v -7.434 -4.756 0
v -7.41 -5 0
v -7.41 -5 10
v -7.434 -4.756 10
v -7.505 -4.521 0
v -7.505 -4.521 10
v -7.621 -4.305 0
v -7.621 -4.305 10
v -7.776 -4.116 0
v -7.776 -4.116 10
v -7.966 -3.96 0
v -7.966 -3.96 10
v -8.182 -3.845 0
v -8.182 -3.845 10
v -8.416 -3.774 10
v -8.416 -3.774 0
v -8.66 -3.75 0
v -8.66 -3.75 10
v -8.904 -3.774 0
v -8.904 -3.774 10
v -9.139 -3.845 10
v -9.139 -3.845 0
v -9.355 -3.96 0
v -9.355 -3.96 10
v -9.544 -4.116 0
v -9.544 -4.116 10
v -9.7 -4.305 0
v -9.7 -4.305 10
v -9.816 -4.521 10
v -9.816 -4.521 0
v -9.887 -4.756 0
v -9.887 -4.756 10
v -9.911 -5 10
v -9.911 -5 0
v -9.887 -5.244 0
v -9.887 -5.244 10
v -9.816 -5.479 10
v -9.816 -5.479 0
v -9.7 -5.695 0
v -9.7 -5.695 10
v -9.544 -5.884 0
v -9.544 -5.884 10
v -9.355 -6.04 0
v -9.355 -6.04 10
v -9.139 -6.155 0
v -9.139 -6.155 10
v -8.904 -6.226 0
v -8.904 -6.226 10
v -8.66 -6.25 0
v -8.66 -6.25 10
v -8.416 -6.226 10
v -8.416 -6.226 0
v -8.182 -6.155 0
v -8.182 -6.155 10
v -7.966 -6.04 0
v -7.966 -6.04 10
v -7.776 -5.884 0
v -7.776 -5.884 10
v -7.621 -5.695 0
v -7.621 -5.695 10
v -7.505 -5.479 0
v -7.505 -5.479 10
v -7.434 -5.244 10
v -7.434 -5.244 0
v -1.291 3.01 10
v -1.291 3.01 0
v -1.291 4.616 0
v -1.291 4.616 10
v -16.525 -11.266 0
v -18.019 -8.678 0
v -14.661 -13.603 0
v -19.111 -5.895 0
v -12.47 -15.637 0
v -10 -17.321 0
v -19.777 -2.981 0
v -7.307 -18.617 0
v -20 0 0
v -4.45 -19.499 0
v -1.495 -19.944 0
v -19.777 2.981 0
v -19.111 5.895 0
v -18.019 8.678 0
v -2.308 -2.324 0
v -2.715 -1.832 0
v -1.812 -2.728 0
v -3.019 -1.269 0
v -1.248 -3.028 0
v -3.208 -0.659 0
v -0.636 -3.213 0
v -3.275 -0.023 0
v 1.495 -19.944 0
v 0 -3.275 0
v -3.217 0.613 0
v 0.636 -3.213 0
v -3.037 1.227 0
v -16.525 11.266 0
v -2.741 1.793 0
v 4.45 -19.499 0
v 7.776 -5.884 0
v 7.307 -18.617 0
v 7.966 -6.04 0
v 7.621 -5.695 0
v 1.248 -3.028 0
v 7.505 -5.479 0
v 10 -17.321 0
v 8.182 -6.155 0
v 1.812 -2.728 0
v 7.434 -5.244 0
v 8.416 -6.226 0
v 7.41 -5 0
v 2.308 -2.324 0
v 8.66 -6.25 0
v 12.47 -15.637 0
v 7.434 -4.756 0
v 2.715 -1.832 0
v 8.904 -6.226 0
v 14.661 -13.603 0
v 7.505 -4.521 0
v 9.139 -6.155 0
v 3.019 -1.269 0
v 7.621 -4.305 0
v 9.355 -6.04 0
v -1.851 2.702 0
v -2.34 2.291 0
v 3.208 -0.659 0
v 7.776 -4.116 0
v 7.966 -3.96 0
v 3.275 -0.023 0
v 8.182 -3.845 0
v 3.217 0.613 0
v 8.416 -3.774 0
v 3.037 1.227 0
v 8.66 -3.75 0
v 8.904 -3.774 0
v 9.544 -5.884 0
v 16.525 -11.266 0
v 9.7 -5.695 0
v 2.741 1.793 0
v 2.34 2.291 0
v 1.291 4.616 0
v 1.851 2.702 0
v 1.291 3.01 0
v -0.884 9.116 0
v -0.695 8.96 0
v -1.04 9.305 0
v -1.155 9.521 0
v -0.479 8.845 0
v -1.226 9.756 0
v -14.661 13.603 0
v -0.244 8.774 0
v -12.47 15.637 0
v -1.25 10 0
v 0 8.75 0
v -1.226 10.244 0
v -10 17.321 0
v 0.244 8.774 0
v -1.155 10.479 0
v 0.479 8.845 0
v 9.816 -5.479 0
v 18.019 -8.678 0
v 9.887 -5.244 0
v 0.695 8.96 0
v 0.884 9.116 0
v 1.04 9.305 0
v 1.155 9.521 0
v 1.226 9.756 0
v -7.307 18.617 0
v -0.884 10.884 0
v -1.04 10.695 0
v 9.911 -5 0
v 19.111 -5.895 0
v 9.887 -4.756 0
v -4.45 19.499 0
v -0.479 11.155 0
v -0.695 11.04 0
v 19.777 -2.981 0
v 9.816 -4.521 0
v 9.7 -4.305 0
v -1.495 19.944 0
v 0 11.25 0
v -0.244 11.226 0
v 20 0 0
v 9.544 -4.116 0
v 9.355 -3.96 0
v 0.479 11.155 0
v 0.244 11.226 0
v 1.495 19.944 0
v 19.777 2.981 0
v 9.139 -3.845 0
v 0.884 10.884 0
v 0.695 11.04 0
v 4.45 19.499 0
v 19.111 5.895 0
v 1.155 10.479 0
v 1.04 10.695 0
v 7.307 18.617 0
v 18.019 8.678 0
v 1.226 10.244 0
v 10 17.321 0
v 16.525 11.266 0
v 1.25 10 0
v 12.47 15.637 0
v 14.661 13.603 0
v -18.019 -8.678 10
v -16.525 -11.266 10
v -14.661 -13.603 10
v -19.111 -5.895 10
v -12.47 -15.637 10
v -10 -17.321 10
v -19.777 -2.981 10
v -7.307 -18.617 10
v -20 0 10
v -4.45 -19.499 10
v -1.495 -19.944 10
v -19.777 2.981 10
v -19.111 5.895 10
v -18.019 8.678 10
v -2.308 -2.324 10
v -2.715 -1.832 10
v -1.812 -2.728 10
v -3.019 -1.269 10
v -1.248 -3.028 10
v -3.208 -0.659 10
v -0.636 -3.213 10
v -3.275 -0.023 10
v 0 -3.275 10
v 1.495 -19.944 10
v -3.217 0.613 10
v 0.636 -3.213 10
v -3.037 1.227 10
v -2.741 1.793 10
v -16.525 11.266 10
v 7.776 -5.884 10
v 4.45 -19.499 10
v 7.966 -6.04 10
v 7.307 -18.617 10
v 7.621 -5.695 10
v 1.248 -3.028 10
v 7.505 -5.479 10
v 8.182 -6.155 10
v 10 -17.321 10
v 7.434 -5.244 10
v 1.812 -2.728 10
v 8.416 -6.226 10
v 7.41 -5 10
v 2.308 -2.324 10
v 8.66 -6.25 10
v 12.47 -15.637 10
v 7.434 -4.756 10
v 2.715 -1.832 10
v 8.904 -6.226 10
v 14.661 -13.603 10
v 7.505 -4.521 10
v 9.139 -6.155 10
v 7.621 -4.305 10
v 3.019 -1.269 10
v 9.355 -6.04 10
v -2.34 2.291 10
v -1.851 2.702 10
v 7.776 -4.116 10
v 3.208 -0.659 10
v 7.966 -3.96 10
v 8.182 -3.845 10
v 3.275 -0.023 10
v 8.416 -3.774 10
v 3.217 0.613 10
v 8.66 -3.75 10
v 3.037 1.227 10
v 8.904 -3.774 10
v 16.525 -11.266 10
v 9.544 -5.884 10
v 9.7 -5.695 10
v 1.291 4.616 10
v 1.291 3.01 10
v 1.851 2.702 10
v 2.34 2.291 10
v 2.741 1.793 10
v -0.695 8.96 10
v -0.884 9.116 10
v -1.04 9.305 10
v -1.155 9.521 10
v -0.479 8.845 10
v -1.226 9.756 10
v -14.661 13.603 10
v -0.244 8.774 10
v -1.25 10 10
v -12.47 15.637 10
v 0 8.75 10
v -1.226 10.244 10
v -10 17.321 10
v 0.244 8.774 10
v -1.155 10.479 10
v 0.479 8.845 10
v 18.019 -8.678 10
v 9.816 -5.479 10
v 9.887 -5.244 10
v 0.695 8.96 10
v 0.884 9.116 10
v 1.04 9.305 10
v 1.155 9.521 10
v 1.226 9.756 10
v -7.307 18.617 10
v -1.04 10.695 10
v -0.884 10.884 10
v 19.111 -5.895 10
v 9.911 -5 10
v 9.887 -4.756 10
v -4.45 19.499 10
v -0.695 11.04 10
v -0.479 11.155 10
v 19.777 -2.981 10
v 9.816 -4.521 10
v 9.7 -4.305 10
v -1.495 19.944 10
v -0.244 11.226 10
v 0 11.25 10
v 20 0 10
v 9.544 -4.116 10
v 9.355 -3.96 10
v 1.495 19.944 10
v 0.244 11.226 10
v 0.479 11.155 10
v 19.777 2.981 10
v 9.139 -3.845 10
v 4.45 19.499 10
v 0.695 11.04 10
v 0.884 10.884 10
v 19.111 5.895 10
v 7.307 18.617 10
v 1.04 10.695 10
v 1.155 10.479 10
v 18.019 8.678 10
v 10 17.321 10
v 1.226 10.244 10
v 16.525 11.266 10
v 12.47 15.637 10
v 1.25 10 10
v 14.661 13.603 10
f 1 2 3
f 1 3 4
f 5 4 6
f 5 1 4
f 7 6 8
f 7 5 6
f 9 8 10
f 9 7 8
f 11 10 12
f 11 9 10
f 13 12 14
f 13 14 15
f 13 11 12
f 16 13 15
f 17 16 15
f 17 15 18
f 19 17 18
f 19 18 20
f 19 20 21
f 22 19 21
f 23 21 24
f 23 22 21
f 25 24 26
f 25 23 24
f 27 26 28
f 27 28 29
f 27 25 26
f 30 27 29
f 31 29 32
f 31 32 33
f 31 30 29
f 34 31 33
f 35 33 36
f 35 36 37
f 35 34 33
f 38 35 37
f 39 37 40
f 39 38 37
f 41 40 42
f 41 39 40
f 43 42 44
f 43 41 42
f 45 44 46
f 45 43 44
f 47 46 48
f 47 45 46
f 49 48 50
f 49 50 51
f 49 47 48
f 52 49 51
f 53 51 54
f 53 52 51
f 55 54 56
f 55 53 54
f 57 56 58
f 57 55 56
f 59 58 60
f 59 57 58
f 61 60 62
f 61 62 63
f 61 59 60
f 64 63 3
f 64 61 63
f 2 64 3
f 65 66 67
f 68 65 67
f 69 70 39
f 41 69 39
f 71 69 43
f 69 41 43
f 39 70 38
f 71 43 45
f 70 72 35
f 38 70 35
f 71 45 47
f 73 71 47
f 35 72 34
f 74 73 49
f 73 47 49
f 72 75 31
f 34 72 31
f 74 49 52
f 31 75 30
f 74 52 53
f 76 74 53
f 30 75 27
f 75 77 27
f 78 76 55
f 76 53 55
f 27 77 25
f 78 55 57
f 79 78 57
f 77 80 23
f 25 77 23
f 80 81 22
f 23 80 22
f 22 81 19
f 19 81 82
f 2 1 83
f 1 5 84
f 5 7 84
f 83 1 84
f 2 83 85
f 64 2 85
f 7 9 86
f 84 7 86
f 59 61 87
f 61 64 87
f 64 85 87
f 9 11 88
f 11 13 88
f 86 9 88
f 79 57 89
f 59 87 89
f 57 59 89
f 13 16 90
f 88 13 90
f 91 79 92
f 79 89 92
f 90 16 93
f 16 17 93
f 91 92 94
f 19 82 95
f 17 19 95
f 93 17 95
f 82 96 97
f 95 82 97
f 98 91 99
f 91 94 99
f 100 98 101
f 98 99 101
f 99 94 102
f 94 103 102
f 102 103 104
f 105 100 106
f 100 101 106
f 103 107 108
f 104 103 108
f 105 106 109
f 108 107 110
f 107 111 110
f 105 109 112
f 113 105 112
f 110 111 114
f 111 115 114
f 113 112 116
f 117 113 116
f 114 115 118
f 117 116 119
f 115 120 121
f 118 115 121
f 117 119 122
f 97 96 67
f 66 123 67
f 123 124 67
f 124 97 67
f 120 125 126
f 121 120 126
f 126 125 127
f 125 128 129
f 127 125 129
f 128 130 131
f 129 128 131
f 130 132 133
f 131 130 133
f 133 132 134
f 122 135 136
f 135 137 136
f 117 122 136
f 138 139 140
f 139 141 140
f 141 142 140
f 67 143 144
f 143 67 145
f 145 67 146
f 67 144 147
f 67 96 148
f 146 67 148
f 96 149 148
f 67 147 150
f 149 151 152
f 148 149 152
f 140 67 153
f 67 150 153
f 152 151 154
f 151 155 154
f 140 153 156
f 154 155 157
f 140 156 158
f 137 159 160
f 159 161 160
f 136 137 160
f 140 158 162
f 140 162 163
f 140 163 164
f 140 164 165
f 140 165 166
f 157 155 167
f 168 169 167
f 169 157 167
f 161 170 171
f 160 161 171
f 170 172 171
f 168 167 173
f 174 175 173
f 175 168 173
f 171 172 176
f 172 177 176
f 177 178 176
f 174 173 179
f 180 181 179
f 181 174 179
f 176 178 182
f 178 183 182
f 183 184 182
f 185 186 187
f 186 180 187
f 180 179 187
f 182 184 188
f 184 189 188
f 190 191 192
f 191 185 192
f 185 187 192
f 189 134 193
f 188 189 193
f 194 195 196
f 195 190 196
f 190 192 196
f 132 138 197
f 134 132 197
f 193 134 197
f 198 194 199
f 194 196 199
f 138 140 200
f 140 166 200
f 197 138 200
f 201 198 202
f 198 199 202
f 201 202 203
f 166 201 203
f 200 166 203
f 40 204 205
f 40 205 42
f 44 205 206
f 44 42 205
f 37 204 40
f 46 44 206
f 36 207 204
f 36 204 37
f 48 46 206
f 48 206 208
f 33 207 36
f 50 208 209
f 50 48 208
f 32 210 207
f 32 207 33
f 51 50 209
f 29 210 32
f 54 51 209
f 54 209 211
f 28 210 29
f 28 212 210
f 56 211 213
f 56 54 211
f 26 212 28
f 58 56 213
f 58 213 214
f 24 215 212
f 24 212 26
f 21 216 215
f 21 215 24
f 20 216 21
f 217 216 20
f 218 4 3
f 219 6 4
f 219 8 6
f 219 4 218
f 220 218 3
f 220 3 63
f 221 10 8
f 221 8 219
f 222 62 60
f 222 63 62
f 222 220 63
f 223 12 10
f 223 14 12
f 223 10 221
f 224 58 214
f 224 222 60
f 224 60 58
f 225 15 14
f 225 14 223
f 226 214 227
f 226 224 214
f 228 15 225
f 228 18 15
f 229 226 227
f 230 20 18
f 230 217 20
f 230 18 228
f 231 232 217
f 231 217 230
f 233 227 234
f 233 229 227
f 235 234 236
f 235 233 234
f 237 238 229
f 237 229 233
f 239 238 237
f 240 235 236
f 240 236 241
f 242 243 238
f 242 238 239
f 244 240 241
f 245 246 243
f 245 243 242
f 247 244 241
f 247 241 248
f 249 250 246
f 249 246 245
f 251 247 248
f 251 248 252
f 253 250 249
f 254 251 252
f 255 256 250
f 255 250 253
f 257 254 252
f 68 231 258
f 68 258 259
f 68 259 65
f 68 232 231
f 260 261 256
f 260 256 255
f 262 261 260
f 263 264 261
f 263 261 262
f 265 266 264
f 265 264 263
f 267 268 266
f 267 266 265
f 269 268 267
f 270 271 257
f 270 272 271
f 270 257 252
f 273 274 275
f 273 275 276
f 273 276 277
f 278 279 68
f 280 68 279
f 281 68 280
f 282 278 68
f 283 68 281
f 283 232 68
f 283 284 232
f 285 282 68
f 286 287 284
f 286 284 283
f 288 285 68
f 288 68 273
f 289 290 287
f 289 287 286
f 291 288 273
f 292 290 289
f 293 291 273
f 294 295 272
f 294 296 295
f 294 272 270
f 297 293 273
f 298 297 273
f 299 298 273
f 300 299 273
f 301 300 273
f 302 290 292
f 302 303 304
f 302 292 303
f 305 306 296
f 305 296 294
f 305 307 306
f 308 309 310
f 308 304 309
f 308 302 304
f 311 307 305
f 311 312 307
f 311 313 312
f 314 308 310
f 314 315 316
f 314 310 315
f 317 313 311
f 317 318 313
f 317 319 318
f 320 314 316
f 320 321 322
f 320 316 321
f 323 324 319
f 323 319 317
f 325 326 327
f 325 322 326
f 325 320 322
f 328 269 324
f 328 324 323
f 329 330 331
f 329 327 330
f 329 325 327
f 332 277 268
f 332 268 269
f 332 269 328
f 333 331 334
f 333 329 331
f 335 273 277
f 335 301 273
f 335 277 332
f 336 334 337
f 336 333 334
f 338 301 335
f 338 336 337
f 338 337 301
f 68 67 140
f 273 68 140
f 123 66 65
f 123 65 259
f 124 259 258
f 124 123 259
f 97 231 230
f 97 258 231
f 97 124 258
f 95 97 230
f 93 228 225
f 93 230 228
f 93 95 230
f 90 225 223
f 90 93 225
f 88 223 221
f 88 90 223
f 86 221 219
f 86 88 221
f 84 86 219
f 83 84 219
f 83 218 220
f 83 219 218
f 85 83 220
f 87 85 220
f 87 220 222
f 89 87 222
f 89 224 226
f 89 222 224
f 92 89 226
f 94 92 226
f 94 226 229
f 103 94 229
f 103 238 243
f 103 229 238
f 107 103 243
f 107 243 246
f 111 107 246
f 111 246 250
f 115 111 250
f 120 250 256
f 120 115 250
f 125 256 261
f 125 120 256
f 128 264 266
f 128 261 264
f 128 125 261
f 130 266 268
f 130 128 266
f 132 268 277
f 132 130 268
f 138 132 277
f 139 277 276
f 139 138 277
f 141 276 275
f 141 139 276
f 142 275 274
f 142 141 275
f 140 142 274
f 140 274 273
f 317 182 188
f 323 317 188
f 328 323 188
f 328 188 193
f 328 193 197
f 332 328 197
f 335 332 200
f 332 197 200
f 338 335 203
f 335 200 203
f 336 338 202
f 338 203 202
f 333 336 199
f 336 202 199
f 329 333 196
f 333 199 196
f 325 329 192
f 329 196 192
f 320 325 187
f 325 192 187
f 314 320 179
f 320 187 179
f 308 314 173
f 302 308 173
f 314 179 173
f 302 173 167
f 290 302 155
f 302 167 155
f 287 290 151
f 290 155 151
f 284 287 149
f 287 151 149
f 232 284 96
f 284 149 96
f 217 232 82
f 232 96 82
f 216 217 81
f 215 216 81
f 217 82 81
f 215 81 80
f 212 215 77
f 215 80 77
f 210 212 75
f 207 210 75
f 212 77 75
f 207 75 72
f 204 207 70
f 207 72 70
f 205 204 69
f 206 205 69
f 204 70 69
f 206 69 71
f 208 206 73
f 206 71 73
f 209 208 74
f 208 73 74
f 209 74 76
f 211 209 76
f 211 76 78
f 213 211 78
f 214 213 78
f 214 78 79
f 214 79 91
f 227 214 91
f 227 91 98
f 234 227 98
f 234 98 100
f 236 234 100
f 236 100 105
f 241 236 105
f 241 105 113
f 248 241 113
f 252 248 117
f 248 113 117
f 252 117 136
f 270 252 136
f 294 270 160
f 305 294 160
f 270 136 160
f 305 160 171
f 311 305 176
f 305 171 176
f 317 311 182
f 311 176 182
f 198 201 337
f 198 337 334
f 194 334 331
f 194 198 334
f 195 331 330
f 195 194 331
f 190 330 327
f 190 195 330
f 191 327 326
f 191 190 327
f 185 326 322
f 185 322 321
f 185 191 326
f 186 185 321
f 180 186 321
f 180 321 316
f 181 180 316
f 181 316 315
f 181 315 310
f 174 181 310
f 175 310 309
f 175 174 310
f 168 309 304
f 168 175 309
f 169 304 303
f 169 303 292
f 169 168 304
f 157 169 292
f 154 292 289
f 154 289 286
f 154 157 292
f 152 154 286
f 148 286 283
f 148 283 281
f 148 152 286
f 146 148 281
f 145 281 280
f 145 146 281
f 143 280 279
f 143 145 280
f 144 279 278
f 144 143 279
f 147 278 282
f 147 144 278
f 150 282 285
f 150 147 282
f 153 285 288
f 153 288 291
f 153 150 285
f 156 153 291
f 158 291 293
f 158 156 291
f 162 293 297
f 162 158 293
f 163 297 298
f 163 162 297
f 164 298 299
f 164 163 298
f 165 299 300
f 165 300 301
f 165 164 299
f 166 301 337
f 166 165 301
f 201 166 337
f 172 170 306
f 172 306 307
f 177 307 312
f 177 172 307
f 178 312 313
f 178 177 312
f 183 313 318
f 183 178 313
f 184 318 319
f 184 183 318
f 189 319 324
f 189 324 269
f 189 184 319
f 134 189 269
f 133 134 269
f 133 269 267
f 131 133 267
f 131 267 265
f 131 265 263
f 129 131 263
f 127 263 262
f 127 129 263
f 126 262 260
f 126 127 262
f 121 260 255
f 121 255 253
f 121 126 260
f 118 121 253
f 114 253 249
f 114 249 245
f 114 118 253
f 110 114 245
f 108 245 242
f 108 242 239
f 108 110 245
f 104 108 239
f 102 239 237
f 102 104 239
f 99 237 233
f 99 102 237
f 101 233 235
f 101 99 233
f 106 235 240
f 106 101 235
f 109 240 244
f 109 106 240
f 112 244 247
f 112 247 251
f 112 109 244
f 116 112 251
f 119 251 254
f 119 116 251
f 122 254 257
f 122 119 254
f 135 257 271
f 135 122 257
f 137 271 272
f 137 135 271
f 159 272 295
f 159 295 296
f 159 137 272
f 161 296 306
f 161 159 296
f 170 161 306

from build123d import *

# Parameters (mm, degrees)
SKETCH1_R               = 20
SKETCH1_R_2             = 1.250479472
SKETCH1_R_3             = 3.275
BOSS_EXTRUDE1_DEPTH     = 10
CUT_EXTRUDE1_DEPTH      = 31
CUT_EXTRUDE1_DEPTH_BACK = 31
SKETCH2_W               = 2.58125
SKETCH2_H               = 4.615625


with BuildPart() as part:
    # Sketch1 → Boss-Extrude1 (new body)
    with BuildSketch(Plane.XY):
        Circle(SKETCH1_R)
        with Locations((0, 10)):
            Circle(SKETCH1_R_2, mode=Mode.SUBTRACT)
        Circle(SKETCH1_R_3, mode=Mode.SUBTRACT)
        with Locations((8.660254038, -5)):
            Circle(SKETCH1_R_2, mode=Mode.SUBTRACT)
        with Locations((-8.660254038, -5)):
            Circle(SKETCH1_R_2, mode=Mode.SUBTRACT)
    extrude(amount=BOSS_EXTRUDE1_DEPTH)

    # Sketch2 → Cut-Extrude1 (cut, two sides: drawn at the far end of the back side and taken through both)
    with BuildSketch(Plane.XY.offset(10).offset(-CUT_EXTRUDE1_DEPTH_BACK)):
        with Locations((0, 2.3078125)):
            Rectangle(SKETCH2_W, SKETCH2_H)
    extrude(amount=CUT_EXTRUDE1_DEPTH + CUT_EXTRUDE1_DEPTH_BACK, mode=Mode.SUBTRACT)


solid = part.part
